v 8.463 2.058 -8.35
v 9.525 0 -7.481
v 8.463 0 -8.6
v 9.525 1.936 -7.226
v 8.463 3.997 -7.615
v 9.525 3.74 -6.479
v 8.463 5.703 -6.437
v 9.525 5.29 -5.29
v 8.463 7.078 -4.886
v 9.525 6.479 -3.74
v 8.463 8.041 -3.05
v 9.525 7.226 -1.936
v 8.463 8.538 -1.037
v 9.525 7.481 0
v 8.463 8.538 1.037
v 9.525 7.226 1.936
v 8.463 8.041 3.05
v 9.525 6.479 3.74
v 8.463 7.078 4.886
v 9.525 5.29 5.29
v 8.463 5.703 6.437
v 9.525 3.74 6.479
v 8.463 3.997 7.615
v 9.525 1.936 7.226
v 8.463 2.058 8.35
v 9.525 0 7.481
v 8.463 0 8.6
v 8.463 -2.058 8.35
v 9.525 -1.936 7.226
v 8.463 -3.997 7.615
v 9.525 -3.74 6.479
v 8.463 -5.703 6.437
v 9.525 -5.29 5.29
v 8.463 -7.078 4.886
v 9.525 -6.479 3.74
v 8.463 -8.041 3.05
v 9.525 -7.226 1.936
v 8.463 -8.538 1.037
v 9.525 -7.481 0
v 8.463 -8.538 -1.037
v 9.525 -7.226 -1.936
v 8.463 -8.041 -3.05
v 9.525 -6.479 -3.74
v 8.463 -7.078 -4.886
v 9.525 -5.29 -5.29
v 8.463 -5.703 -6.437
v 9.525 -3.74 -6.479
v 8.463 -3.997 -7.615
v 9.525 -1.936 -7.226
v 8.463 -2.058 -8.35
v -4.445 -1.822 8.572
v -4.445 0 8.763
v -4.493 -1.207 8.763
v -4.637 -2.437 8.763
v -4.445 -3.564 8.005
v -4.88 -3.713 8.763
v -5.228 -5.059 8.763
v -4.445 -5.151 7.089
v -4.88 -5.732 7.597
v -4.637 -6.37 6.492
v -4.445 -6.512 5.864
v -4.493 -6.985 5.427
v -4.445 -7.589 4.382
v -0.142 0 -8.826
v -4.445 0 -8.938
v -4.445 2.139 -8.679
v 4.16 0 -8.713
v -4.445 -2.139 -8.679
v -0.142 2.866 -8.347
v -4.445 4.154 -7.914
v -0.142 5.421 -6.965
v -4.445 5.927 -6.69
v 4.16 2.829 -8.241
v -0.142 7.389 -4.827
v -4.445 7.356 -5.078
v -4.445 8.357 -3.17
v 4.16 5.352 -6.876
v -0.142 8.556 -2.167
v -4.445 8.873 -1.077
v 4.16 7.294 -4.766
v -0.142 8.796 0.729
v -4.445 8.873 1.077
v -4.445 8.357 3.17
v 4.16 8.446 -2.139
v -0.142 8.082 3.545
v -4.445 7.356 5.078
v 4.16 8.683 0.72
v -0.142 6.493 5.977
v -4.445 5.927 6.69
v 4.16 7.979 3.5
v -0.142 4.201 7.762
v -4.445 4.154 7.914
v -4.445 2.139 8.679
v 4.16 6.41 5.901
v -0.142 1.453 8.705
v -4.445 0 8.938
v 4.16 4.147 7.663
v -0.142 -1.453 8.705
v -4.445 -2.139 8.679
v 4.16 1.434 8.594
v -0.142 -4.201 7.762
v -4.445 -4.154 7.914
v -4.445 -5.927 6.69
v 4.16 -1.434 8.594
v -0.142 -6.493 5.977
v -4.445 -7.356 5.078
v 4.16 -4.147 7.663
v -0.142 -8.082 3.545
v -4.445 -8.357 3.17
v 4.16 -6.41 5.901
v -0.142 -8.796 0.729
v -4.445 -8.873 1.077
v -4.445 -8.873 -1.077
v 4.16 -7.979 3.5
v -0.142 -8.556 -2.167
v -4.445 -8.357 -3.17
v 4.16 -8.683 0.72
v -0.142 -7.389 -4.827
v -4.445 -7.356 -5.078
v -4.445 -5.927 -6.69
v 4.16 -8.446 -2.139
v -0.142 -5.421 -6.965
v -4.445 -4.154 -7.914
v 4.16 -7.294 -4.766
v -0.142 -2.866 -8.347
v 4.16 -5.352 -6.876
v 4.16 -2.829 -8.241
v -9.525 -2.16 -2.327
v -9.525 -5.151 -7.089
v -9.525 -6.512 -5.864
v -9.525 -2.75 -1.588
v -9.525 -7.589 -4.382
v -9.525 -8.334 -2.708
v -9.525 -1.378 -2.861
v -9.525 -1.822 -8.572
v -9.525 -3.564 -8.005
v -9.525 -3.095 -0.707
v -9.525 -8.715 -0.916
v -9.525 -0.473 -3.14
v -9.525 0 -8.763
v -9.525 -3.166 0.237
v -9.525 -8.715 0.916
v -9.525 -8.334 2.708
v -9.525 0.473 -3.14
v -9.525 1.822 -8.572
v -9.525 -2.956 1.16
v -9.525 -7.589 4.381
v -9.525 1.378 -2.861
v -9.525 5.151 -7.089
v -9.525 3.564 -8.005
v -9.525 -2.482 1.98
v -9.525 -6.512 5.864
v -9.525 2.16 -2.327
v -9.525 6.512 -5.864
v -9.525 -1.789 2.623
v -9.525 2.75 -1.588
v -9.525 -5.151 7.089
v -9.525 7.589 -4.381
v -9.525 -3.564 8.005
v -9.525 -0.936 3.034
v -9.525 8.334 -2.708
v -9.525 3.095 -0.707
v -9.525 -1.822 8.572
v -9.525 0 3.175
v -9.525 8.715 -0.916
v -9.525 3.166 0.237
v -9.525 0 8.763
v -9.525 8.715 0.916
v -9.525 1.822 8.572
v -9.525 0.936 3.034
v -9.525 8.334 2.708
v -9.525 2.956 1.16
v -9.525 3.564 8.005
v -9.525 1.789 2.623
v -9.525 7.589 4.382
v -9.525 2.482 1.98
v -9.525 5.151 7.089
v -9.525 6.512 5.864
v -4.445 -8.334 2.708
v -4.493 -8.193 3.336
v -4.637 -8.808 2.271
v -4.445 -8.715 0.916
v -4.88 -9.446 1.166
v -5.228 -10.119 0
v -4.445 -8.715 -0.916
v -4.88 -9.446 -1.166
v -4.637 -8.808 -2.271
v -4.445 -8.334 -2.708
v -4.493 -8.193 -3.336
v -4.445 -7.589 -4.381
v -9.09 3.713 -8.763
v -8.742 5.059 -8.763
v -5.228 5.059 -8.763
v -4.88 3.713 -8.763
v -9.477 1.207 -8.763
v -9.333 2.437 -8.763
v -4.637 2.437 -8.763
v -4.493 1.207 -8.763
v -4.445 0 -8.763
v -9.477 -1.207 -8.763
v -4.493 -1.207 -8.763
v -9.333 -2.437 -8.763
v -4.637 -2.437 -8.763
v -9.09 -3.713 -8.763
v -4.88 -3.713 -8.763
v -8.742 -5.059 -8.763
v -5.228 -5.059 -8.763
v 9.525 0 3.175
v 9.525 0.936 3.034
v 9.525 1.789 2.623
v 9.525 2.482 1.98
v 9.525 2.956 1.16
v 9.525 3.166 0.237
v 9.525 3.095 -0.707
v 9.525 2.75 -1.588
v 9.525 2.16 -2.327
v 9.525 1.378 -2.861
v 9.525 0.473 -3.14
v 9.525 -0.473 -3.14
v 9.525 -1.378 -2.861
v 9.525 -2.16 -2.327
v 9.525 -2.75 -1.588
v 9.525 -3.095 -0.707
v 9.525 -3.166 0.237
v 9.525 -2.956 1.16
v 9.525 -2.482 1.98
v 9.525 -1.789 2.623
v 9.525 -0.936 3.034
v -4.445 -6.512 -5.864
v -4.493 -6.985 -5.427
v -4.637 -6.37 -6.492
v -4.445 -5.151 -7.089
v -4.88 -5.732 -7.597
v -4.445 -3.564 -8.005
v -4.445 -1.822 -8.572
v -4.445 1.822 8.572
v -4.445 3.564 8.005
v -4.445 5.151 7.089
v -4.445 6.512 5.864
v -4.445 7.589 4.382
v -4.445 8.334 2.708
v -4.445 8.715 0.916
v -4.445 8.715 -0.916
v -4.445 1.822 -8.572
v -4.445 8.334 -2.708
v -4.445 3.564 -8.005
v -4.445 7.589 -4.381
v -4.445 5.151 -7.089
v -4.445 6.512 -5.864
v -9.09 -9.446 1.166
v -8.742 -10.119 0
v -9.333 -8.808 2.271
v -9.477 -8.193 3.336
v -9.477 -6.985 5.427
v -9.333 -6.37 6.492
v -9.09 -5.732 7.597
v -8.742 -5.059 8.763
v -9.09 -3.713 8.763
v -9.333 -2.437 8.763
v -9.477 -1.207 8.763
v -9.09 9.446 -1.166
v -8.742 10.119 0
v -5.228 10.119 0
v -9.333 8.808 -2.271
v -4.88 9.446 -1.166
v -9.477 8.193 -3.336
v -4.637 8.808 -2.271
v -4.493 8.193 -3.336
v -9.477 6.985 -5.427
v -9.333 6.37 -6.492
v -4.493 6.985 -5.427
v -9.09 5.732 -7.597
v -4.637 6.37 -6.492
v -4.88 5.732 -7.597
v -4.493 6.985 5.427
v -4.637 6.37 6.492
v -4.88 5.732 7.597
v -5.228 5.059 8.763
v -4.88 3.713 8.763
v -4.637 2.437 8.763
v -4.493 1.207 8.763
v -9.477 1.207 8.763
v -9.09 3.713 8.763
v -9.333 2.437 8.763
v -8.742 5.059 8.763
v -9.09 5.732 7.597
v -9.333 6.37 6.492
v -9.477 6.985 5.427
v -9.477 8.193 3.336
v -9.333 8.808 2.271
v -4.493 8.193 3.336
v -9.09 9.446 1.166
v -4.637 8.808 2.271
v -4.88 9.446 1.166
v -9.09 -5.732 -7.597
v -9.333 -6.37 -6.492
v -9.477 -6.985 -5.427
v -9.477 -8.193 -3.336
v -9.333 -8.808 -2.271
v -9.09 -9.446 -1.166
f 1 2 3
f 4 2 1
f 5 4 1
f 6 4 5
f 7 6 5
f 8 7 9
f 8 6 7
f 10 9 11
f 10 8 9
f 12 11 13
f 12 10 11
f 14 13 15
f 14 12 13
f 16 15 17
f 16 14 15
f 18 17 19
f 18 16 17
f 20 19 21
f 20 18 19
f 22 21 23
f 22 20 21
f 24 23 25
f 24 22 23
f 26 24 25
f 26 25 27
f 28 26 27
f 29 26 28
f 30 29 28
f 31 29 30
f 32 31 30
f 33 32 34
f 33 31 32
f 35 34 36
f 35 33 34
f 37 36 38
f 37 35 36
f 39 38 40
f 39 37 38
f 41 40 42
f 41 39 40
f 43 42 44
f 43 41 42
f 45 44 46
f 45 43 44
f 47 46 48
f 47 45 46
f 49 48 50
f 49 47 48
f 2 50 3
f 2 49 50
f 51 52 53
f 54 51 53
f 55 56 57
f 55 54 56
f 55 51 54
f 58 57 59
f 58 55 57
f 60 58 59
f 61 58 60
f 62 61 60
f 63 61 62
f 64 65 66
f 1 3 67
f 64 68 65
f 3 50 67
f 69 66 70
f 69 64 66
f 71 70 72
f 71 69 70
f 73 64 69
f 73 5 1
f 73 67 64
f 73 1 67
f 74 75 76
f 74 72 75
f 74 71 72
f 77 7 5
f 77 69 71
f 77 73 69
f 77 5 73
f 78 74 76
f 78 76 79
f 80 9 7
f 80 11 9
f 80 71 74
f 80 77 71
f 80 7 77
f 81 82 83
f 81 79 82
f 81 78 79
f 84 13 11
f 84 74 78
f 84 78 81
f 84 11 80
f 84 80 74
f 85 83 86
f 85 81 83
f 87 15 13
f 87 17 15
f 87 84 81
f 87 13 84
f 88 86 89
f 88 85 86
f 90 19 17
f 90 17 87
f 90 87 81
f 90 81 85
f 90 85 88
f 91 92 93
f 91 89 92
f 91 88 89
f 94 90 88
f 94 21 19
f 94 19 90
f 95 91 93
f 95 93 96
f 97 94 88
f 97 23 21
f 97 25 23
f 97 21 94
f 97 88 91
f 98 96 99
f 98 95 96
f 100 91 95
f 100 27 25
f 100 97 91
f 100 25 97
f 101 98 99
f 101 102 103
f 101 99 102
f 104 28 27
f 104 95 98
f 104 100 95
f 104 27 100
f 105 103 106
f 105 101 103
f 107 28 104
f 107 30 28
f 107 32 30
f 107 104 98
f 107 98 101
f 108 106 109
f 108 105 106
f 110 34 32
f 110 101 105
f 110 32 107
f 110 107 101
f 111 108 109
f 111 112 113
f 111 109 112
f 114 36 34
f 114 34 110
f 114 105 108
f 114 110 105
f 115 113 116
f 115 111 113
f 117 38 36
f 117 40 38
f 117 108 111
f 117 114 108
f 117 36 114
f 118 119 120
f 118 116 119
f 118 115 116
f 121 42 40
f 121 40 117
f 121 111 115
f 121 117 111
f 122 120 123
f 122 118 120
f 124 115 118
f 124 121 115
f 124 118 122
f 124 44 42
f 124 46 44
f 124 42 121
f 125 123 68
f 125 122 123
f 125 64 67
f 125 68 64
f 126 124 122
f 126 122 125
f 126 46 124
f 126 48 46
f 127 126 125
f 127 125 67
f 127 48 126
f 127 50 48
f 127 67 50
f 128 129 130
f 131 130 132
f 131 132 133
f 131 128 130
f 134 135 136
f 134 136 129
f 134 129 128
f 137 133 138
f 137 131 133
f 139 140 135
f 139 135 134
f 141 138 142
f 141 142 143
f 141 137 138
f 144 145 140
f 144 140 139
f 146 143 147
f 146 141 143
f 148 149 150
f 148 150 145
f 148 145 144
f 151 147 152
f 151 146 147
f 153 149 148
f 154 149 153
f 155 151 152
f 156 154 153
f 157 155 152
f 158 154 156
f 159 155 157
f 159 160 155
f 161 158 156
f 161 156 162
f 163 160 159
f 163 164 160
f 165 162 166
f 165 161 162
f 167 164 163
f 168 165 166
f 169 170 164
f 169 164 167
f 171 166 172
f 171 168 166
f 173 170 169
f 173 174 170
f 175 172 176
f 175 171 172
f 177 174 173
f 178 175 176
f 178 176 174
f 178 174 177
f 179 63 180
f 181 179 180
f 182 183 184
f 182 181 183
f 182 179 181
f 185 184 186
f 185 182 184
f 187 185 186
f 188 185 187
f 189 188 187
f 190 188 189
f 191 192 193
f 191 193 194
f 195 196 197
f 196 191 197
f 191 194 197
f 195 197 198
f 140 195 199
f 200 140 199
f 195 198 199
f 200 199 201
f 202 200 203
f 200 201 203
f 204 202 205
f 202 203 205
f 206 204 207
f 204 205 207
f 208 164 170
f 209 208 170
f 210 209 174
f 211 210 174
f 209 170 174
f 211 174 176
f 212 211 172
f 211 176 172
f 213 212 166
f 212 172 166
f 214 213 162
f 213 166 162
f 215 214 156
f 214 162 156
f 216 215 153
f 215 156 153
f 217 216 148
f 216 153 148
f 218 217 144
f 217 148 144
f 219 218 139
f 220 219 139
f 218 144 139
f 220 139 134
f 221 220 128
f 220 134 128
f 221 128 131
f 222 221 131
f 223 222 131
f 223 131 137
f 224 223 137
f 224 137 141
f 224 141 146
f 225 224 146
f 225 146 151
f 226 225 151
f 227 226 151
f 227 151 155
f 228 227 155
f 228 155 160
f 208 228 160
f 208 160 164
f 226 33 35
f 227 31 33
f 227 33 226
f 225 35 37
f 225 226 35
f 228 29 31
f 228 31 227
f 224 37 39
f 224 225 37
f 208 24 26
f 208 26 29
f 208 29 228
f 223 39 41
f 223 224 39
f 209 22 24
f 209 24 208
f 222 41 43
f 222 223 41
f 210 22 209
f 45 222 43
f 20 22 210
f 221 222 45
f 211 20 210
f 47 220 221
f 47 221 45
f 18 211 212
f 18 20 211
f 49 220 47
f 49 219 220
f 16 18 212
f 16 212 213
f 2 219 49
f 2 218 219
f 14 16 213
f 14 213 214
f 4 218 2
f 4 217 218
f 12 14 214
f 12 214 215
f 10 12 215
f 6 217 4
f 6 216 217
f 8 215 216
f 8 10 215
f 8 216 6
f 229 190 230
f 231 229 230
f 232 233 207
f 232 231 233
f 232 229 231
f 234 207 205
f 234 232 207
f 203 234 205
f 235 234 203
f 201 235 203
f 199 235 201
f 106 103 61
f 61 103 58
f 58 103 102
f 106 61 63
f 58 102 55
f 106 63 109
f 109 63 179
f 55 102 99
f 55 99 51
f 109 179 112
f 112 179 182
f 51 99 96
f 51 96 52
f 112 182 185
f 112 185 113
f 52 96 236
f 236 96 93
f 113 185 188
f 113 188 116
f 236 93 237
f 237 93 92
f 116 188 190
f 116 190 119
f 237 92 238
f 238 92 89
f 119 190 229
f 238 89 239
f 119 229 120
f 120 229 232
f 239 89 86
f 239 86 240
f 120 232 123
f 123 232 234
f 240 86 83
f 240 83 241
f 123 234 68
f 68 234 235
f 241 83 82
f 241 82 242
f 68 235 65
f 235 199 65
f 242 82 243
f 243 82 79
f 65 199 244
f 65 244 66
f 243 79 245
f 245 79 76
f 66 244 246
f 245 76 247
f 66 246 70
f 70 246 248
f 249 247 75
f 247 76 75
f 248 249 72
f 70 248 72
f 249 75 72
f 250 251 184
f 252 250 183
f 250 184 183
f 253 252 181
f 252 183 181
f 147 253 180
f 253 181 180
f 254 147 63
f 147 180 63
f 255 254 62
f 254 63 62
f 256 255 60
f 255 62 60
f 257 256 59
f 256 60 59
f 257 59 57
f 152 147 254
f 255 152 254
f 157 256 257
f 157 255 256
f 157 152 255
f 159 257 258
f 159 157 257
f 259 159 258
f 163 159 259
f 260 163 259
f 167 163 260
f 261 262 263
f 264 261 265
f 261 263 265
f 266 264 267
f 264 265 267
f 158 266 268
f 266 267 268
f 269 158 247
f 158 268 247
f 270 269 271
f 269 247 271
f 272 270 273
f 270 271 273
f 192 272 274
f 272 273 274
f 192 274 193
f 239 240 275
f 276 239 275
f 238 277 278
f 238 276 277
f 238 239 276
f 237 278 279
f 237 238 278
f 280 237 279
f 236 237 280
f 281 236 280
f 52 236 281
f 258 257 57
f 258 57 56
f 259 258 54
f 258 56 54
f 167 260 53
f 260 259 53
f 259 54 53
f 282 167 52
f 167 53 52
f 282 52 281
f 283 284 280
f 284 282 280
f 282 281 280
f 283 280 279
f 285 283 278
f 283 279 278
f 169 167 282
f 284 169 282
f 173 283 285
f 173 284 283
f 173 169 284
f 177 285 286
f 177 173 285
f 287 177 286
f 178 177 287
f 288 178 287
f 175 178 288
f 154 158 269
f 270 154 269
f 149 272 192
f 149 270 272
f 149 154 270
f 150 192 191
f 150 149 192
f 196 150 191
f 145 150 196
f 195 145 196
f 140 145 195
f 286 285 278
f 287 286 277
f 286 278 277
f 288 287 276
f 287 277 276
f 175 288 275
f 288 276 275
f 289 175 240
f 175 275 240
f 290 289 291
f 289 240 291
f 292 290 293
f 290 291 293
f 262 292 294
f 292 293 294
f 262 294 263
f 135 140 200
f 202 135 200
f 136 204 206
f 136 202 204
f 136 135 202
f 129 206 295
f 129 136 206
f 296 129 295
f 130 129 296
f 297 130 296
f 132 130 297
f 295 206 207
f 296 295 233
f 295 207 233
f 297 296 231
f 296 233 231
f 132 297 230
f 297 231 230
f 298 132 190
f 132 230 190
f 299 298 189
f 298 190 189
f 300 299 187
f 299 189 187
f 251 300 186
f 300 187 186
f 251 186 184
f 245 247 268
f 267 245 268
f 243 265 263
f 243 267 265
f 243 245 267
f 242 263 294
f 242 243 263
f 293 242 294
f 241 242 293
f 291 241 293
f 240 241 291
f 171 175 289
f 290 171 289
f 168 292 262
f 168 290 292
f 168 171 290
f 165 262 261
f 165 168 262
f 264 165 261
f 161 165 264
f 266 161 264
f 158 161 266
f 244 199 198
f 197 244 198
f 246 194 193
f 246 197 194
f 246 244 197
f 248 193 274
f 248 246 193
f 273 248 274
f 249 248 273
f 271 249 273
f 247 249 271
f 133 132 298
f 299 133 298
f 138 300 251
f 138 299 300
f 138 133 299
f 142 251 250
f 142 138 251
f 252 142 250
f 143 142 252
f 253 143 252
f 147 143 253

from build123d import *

# Parameters (mm, degrees)
SKETCH2_R          = 8.5725
EXTRUDE1_DEPTH     = 13.97
EXTRUDE1_DRAFT     = 1.5
CHAMFER1_SIZE      = 1.062566667
CHAMFER1_SIZE2     = 1.091513185
EXTRUDE2_DEPTH     = 5.08
SKETCH12_OUTSIDE_W = 110.834
SKETCH12_OUTSIDE_H = 113.196
SKETCH12_OUTSIDE_R = 8.763
CUT_EXTRUDE6_DEPTH = 24.349152203
CUT_EXTRUDE6_DRAFT = -60
SKETCH13_OUTSIDE_W = 97.25
SKETCH13_OUTSIDE_H = 99.612
SKETCH13_OUTSIDE_R = 8.763
CUT_EXTRUDE7_DEPTH = 20.42784879
CUT_EXTRUDE7_DRAFT = -60
SKETCH16_R         = 3.175
CUT_EXTRUDE8_DEPTH = 24.349152203


with BuildPart() as part:
    # Sketch2 → Extrude1 (with draft: the straight prism first)
    with BuildSketch(Plane(origin=(9.525, 0, 0), x_dir=(0, 0, -1), z_dir=(1, 0, 0))):
        Circle(SKETCH2_R)
    extrude(amount=-EXTRUDE1_DEPTH)
    # Extrude1: the draft: its side faces are tilted about the plane it starts from
    extrude1_sides = [part.faces().sort_by_distance(p)[0] for p in [
        (2.54, 0, 8.5725),
    ]]
    draft(extrude1_sides, Plane(origin=(9.525, 0, 0), x_dir=(0, 0, -1), z_dir=(1, 0, 0)), EXTRUDE1_DRAFT)

    # Chamfer1
    chamfer1_edges = [part.edges().sort_by_distance(p)[0] for p in [
        (9.525, 0, 8.5725),
    ]]
    chamfer1_side = [part.faces().sort_by_distance(p)[0] for p in [
        (2.54, 0, 8.755408662),
    ]]
    chamfer(chamfer1_edges, length=CHAMFER1_SIZE, length2=CHAMFER1_SIZE2, reference=chamfer1_side[0])

    # Sketch5 → Extrude2 (add)
    with BuildSketch(Plane.ZY.offset(4.445)):
        Polygon((0, 10.118640818), (-8.763, 5.059320409), (-8.763, -5.059320409), (0, -10.118640818), (8.763, -5.059320409), (8.763, 5.059320409), align=None)
    extrude(amount=EXTRUDE2_DEPTH)


with BuildPart() as cut_extrude6_tool:
    # Sketch12 outside → Cut-Extrude6 (with draft: the straight prism first)
    with BuildSketch(Plane.ZY.offset(9.525)):
        Rectangle(SKETCH12_OUTSIDE_W, SKETCH12_OUTSIDE_H)
        Circle(SKETCH12_OUTSIDE_R, mode=Mode.SUBTRACT)
    extrude(amount=-CUT_EXTRUDE6_DEPTH)
    # Cut-Extrude6: the draft: its side faces are tilted about the plane it starts from
    cut_extrude6_sides = [cut_extrude6_tool.faces().sort_by_distance(p)[0] for p in [
        (2.649576101, -56.598, 0),
        (2.649576101, 0, 55.417),
        (2.649576101, 56.598, 0),
        (2.649576101, 0, -55.417),
        (2.649576101, 0, -8.763),
    ]]
    draft(cut_extrude6_sides, Plane.ZY.offset(9.525), CUT_EXTRUDE6_DRAFT)


with BuildPart() as part_1:
    add(part.part)

    # Cut-Extrude6: cut by cut_extrude6_tool
    add(cut_extrude6_tool.part, mode=Mode.SUBTRACT)


with BuildPart() as cut_extrude7_tool:
    # Sketch13 outside → Cut-Extrude7 (with draft: the straight prism first)
    with BuildSketch(Plane(origin=(-4.445, 0, 0), x_dir=(0, 0, -1), z_dir=(1, 0, 0))):
        Rectangle(SKETCH13_OUTSIDE_W, SKETCH13_OUTSIDE_H)
        Circle(SKETCH13_OUTSIDE_R, mode=Mode.SUBTRACT)
    extrude(amount=-CUT_EXTRUDE7_DEPTH)
    # Cut-Extrude7: the draft: its side faces are tilted about the plane it starts from
    cut_extrude7_sides = [cut_extrude7_tool.faces().sort_by_distance(p)[0] for p in [
        (-14.658924395, -49.806, 0),
        (-14.658924395, 0, -48.625),
        (-14.658924395, 49.806, 0),
        (-14.658924395, 0, 48.625),
        (-14.658924395, 0, 8.763),
    ]]
    draft(cut_extrude7_sides, Plane(origin=(-4.445, 0, 0), x_dir=(0, 0, -1), z_dir=(1, 0, 0)), CUT_EXTRUDE7_DRAFT)


with BuildPart() as part_2:
    add(part_1.part)

    # Cut-Extrude7: cut by cut_extrude7_tool
    add(cut_extrude7_tool.part, mode=Mode.SUBTRACT)

    # Sketch16 → Cut-Extrude8 (cut, through all)
    with BuildSketch(Plane.ZY.offset(9.525)):
        Circle(SKETCH16_R)
    extrude(amount=-CUT_EXTRUDE8_DEPTH, mode=Mode.SUBTRACT)


solid = part_2.part
